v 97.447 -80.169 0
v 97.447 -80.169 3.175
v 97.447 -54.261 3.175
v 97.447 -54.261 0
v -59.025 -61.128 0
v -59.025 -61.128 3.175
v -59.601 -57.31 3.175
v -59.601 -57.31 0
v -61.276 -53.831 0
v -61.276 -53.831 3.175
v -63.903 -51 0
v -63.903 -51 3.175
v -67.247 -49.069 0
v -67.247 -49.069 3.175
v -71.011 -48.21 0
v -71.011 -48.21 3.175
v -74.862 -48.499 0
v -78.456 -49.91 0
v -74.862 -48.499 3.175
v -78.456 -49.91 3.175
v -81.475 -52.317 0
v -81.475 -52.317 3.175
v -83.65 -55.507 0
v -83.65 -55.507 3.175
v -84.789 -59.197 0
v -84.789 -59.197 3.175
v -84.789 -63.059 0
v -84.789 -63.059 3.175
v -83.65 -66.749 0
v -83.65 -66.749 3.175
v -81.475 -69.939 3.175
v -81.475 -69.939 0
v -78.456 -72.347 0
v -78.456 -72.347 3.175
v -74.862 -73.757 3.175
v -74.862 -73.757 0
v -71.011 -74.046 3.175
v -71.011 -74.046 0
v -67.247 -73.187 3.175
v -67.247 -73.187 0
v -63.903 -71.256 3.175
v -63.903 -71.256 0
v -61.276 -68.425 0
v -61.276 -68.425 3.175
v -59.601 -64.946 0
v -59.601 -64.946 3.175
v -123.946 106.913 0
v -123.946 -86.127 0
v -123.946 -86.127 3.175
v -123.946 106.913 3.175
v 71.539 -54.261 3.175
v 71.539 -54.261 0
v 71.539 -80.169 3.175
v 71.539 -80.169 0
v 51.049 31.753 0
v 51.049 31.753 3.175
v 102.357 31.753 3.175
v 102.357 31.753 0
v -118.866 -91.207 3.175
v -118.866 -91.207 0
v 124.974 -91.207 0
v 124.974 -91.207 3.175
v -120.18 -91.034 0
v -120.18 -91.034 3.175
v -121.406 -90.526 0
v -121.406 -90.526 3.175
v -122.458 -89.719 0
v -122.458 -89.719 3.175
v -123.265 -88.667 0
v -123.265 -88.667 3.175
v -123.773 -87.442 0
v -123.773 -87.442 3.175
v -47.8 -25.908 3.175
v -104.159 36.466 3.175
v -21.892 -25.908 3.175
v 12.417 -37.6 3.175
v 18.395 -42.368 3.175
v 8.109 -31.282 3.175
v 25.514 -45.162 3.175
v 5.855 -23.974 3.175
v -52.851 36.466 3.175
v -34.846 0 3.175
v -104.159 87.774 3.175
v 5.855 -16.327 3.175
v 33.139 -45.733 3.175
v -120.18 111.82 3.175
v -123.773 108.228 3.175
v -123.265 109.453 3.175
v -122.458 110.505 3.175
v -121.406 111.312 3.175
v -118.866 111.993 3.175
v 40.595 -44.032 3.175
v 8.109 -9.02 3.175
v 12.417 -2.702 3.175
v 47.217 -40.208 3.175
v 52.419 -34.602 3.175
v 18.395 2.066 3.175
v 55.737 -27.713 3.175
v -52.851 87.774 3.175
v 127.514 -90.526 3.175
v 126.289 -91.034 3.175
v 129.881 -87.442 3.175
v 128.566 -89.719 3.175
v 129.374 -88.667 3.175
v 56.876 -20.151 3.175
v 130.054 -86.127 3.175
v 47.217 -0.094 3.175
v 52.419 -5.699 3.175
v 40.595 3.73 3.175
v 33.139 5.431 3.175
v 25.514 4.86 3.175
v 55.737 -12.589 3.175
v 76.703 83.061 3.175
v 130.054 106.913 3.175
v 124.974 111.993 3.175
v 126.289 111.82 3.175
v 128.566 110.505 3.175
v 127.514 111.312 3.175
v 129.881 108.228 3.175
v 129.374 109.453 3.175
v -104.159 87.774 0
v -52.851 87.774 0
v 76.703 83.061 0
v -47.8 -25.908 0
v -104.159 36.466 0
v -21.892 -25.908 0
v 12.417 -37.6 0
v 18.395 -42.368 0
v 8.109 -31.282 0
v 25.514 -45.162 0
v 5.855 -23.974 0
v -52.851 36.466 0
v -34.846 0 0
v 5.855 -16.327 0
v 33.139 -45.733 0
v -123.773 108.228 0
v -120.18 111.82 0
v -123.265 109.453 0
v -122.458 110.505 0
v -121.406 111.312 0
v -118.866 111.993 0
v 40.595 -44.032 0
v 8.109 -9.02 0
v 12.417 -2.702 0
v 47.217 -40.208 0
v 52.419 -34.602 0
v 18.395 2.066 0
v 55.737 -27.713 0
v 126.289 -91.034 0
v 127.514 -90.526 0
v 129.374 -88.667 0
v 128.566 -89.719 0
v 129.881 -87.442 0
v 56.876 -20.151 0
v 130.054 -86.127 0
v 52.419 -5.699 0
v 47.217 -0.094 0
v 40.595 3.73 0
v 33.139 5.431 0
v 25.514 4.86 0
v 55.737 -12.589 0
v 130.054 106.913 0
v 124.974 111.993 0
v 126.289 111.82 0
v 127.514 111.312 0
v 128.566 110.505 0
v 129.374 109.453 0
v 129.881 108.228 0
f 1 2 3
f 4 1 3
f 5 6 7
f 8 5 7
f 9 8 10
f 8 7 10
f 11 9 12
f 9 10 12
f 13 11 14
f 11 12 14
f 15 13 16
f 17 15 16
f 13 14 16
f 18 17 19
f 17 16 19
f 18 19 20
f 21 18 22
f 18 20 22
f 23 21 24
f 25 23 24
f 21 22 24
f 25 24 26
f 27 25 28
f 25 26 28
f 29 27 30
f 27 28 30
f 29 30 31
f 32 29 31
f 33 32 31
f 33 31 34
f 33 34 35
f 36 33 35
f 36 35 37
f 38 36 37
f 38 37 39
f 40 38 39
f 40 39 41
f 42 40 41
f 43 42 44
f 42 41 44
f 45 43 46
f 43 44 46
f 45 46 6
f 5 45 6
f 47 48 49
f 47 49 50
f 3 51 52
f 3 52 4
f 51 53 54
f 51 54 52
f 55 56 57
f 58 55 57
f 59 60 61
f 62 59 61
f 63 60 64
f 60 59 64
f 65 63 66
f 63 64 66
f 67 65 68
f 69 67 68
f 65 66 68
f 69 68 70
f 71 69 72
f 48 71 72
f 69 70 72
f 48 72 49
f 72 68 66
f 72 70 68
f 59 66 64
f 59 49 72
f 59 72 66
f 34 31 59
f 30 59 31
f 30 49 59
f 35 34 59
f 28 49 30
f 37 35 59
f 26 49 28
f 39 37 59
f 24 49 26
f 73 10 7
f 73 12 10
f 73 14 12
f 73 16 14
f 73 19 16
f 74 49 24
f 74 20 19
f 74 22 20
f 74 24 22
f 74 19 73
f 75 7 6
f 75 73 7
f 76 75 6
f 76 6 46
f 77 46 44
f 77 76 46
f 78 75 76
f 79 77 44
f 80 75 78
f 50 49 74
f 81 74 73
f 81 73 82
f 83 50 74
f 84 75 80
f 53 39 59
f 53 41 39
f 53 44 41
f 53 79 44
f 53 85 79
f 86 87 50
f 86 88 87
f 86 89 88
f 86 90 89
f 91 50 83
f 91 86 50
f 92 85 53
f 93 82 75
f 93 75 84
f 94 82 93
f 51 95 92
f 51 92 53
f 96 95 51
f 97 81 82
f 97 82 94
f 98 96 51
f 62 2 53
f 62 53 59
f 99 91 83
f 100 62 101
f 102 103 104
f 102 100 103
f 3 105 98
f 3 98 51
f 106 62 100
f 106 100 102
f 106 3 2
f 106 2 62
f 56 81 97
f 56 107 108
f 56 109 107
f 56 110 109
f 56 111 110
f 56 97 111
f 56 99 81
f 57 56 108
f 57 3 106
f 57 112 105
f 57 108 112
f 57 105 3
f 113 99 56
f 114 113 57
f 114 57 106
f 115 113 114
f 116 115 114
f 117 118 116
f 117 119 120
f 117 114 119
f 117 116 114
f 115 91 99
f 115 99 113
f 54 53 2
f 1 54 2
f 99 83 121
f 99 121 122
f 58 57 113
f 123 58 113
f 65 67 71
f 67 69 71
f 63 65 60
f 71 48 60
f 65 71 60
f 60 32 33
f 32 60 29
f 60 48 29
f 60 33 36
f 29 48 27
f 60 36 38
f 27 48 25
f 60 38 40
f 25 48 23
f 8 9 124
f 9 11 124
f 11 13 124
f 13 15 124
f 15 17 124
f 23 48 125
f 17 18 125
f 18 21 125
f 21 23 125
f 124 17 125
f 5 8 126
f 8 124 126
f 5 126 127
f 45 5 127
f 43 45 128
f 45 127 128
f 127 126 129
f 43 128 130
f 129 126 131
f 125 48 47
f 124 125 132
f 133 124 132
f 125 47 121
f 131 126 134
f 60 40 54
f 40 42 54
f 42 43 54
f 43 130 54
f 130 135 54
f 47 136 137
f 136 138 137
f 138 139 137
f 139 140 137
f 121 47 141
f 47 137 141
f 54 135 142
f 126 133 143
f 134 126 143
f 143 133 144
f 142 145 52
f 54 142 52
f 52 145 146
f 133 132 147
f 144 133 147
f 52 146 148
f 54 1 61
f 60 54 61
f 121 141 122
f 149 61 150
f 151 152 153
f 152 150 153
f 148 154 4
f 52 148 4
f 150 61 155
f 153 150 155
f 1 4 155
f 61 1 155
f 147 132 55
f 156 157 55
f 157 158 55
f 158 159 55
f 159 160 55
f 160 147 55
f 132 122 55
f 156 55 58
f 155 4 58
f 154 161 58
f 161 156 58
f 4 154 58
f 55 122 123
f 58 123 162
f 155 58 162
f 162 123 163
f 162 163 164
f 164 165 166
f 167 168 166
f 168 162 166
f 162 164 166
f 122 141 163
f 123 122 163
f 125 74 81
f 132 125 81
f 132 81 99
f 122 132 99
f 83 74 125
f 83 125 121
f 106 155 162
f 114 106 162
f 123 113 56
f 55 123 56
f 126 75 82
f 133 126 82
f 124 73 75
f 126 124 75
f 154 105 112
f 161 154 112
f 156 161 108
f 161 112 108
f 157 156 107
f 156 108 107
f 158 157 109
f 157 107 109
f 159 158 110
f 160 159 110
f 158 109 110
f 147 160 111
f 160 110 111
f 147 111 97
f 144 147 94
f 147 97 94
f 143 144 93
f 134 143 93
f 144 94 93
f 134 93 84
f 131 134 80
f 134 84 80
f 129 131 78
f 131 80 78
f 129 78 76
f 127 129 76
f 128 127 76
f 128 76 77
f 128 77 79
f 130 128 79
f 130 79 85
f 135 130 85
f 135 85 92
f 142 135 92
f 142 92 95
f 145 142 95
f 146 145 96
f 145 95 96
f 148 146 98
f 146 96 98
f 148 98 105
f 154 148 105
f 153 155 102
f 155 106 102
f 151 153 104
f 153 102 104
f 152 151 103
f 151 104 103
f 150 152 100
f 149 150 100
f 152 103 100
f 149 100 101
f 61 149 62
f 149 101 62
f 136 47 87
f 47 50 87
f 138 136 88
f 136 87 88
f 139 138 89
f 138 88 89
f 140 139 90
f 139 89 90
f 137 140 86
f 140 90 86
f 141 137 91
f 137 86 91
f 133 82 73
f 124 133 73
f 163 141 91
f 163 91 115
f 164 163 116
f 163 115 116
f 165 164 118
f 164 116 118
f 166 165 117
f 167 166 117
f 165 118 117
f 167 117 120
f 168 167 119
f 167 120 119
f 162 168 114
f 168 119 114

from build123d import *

# Parameters (mm, degrees)
F0_W      = 254
F0_H      = 203.2
F1_DEPTH  = 3.175
F2_W      = 51.308
F2_H      = 51.308
F3_DEPTH  = 3.175
F4_W      = 25.908
F4_H      = 25.908
F5_DEPTH  = 3.175
F6_R      = 12.954
F7_DEPTH  = 3.175
F9_DEPTH  = 3.176
F10_R     = 25.654
F11_DEPTH = 3.175
F13_DEPTH = 3.175
F14_R     = 5.08
F15_R     = 5.08
F16_R     = 5.08
F17_R     = 5.08


with BuildPart() as f1:
    # F0 (on Top) → F1 (new body)
    with BuildSketch(Plane.XY):
        with Locations((3.054343, 10.392927)):
            Rectangle(F0_W, F0_H)
    extrude(amount=F1_DEPTH)

    # F2 (on face) → F3 (cut, through all)
    with BuildSketch(Plane.XY.offset(3.175)):
        with Locations((-78.505307, 62.120071)):
            Rectangle(F2_W, F2_H)
    extrude(amount=-F3_DEPTH, mode=Mode.SUBTRACT)

    # F4 (on face) → F5 (cut, through all)
    with BuildSketch(Plane.XY.offset(3.175)):
        with Locations((84.492568, -67.214648)):
            Rectangle(F4_W, F4_H)
    extrude(amount=-F5_DEPTH, mode=Mode.SUBTRACT)

    # F6 (on face) → F7 (cut, through all)
    with BuildSketch(Plane.XY.offset(3.175)):
        with Locations((-71.979322, -61.128017)):
            Circle(F6_R)
    extrude(amount=-F7_DEPTH, mode=Mode.SUBTRACT)

    # F8 (on face) → F9 (cut, through all)
    with BuildSketch(Plane.XY.offset(3.175)):
        Polygon((76.70291, 83.061458), (51.04891, 31.753458), (102.35691, 31.753458), align=None)
    extrude(amount=-F9_DEPTH, mode=Mode.SUBTRACT)

    # F10 (on face) → F11 (cut, through all)
    with BuildSketch(Plane.XY.offset(3.175)):
        with Locations((31.222314, -20.150894)):
            Circle(F10_R)
    extrude(amount=-F11_DEPTH, mode=Mode.SUBTRACT)

    # F12 (on face) → F13 (cut, through all)
    with BuildSketch(Plane.XY.offset(3.175)):
        Polygon((-34.845916, 0), (-47.799916, -25.908), (-21.891916, -25.908), align=None)
    extrude(amount=-F13_DEPTH, mode=Mode.SUBTRACT)

    # F14
    f14_edges = [f1.edges().sort_by_distance(p)[0] for p in [
        (-123.945657, 111.992927, 1.5875),
    ]]
    fillet(f14_edges, radius=F14_R)

    # F15
    f15_edges = [f1.edges().sort_by_distance(p)[0] for p in [
        (130.054343, 111.992927, 1.5875),
    ]]
    fillet(f15_edges, radius=F15_R)

    # F16
    f16_edges = [f1.edges().sort_by_distance(p)[0] for p in [
        (130.054343, -91.207073, 1.5875),
    ]]
    fillet(f16_edges, radius=F16_R)

    # F17
    f17_edges = [f1.edges().sort_by_distance(p)[0] for p in [
        (-123.945657, -91.207073, 1.5875),
    ]]
    fillet(f17_edges, radius=F17_R)


solid = f1.part
